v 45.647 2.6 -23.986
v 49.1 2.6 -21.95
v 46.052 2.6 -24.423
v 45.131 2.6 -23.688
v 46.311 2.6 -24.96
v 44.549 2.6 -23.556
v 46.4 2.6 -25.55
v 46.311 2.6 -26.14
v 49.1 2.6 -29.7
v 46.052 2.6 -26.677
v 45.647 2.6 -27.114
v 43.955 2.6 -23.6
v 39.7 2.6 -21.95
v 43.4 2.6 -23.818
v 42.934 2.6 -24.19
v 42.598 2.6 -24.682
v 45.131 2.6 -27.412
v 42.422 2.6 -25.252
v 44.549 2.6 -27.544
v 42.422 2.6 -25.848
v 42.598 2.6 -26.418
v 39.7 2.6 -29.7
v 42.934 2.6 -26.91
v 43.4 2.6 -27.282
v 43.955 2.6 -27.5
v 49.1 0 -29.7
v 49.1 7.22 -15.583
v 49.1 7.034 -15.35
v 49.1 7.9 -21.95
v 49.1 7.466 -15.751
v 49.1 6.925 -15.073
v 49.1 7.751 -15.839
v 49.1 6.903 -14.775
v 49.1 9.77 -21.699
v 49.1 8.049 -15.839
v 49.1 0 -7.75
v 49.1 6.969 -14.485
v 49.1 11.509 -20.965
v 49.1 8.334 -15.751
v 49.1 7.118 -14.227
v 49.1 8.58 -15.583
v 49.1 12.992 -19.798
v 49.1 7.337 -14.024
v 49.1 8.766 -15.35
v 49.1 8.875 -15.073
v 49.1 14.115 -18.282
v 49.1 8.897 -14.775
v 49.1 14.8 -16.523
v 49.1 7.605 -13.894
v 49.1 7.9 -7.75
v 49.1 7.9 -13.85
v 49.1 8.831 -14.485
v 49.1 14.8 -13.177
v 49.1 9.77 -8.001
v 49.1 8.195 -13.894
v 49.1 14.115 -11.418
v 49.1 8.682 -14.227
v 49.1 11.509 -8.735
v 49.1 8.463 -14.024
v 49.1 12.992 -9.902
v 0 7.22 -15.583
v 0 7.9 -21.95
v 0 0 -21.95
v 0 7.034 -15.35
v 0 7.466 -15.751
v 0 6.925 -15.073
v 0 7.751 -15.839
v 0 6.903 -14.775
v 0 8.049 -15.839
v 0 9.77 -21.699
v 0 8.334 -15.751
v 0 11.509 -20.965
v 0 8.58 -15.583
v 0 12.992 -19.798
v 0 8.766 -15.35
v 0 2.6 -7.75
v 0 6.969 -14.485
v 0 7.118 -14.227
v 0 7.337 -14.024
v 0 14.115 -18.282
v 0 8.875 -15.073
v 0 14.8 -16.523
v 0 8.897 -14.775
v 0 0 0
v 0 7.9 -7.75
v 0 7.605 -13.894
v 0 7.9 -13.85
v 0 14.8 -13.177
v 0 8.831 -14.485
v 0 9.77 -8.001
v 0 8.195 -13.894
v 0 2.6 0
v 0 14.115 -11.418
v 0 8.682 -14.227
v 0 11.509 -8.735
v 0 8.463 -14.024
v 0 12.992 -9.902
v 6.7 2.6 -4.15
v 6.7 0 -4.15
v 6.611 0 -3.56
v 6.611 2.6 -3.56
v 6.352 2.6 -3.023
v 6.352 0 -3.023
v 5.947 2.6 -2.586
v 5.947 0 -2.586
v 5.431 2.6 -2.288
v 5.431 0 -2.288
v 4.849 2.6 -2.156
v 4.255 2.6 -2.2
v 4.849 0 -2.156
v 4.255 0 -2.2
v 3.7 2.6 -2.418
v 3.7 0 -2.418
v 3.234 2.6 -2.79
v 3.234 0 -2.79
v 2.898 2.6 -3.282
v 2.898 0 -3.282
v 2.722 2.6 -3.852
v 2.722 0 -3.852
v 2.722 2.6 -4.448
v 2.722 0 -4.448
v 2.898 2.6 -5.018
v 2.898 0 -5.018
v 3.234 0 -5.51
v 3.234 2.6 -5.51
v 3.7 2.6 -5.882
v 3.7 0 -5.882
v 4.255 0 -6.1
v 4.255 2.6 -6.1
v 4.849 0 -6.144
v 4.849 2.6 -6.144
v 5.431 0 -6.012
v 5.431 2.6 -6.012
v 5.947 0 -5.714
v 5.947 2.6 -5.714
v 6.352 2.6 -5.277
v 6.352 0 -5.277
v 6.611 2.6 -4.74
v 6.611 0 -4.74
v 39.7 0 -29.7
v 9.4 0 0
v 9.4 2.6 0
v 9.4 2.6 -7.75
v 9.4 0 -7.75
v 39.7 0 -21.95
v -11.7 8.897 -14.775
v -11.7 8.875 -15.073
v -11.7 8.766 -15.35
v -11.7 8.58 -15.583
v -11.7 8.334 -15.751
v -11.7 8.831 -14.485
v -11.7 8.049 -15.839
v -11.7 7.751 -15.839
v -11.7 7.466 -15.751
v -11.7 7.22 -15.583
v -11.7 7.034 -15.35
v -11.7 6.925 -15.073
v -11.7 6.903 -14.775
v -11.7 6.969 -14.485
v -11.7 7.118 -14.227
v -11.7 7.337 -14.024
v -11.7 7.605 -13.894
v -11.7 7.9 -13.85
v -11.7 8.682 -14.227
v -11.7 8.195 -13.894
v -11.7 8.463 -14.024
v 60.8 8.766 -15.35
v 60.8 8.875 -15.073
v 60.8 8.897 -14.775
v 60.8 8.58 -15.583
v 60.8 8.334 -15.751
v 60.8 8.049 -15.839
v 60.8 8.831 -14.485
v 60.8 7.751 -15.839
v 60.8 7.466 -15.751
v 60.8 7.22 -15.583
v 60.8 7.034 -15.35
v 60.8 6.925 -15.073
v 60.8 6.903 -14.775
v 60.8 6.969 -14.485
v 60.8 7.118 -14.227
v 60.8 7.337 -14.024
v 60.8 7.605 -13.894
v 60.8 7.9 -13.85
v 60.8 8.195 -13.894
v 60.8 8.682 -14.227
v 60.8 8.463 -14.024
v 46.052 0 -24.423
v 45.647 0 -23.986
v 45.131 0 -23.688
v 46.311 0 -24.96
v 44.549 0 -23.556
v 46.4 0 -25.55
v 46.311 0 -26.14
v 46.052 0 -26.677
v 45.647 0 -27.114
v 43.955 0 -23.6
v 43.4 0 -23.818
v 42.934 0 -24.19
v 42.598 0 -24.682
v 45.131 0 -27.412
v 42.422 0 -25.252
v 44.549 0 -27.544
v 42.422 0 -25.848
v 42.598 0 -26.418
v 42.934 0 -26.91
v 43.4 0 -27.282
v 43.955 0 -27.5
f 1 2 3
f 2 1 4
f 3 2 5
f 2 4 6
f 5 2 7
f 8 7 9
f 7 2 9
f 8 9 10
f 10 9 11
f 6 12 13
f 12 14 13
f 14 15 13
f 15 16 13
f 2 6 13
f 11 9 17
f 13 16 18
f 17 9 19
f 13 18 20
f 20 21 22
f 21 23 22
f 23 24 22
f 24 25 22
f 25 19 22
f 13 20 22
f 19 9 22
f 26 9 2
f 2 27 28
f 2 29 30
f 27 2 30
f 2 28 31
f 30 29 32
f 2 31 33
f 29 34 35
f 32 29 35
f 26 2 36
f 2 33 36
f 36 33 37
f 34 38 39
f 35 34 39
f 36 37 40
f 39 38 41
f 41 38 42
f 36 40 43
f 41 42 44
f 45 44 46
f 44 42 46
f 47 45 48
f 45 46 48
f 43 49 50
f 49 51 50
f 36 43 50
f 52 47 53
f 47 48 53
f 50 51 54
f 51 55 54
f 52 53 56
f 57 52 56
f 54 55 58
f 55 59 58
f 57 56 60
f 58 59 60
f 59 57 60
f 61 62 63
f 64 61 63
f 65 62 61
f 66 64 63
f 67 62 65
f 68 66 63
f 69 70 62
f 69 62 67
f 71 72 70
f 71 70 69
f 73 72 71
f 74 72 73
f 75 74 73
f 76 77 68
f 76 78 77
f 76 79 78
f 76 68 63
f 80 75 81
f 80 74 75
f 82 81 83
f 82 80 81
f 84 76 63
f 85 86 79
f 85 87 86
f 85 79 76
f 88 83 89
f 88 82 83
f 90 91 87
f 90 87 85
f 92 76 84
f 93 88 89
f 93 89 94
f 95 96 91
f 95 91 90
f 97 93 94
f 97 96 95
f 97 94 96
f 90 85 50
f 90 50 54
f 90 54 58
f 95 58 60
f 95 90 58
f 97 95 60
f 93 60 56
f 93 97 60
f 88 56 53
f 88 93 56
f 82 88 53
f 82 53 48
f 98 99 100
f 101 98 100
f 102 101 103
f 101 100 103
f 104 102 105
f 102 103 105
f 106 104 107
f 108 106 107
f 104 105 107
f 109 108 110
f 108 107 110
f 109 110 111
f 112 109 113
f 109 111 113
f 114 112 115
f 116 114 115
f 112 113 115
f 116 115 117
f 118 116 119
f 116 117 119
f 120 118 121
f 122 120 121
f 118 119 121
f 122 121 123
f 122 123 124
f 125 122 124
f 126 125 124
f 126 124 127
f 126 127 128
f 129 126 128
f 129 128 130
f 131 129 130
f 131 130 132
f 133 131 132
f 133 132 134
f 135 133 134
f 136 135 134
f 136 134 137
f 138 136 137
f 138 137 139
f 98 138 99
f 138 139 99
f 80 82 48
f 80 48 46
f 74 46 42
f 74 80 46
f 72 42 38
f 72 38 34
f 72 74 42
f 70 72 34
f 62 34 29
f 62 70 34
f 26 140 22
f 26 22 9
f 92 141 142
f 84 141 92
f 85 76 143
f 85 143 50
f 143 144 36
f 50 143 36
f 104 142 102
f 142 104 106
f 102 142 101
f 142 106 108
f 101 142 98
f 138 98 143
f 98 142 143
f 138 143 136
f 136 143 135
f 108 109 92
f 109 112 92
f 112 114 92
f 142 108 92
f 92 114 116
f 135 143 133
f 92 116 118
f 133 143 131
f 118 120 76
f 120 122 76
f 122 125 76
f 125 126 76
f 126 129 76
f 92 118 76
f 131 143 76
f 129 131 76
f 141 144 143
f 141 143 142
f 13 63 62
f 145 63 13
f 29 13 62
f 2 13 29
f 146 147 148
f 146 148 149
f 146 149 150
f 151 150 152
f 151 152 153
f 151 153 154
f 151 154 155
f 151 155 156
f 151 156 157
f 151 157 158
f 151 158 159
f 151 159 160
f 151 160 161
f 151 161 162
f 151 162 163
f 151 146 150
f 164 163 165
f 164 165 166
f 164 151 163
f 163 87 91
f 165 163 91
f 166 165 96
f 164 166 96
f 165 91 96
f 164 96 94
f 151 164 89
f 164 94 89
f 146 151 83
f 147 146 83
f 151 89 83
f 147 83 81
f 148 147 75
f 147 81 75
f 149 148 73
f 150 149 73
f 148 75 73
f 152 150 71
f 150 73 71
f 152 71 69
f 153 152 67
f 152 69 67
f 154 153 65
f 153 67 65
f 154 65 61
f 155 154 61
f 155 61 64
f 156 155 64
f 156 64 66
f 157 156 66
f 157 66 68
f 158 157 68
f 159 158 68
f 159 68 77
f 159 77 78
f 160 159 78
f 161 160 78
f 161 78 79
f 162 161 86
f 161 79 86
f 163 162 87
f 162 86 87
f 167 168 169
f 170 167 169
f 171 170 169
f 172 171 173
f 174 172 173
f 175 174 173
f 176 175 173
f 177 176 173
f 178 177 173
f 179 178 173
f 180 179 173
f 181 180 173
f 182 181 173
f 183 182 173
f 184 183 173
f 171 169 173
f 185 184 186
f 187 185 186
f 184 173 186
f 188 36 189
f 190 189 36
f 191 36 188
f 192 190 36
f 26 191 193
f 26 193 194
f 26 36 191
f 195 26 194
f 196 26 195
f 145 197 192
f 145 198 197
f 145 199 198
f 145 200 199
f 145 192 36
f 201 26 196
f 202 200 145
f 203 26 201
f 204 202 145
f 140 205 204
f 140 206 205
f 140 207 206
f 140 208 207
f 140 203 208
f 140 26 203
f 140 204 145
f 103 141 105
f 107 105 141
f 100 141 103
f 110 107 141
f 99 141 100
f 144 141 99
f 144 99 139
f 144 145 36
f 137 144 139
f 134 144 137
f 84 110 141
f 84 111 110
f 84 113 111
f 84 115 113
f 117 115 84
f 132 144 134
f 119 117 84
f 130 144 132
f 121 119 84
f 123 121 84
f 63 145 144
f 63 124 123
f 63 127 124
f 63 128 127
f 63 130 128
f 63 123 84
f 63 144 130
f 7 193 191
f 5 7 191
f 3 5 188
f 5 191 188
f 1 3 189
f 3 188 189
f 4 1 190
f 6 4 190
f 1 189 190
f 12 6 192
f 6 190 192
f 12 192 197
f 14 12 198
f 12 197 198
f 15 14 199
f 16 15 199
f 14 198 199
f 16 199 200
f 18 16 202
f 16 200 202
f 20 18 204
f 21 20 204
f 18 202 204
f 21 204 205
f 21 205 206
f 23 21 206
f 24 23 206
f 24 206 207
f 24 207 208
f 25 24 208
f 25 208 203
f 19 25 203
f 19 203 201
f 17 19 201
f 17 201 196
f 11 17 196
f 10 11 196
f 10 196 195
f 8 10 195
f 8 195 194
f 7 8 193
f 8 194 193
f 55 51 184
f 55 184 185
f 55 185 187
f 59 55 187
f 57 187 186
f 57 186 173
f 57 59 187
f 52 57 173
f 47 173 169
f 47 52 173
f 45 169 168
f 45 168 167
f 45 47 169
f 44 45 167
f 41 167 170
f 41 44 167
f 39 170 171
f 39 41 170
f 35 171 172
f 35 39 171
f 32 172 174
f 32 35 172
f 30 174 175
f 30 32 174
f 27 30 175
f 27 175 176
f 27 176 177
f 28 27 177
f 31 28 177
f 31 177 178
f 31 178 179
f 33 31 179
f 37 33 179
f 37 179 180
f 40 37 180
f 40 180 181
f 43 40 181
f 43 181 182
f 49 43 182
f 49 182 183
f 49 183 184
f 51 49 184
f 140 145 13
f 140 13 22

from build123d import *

# Parameters (mm, degrees)
DODANIE_WYCI_GNI_CIE1_DEPTH      = 2.6
SZKIC4_R                         = 2
WYTNIJ_WYCI_GNI_CIE1_DEPTH       = 2.6
SZKIC5_W                         = 49.1
SZKIC5_H                         = 14.2
DODANIE_WYCI_GNI_CIE3_DEPTH      = 5.3
DODANIE_WYCI_GNI_CIE4_DEPTH      = 49.1
SZKIC10_R                        = 1
DODANIE_WYCI_GNI_CIE5_DEPTH      = 11.7
DODANIE_WYCI_GNI_CIE5_DEPTH_BACK = 60.8


with BuildPart() as part:
    # Szkic1 → Dodanie-wyciągnięcie1 (new body)
    with BuildSketch(Plane(origin=(0, 0, 0), x_dir=(1, 0, 0), z_dir=(0, 1, 0))):
        Polygon((0, 0), (0, 21.95), (39.7, 21.95), (39.7, 29.7), (49.1, 29.7), (49.1, 7.75), (9.4, 7.75), (9.4, 0), align=None)
    extrude(amount=DODANIE_WYCI_GNI_CIE1_DEPTH)

    # Szkic4 → Wytnij-wyciągnięcie1 (cut)
    with BuildSketch(Plane.XZ):
        with Locations((4.7, -4.15)):
            Circle(SZKIC4_R)
        with Locations((44.4, -25.55)):
            Circle(SZKIC4_R)
    extrude(amount=-WYTNIJ_WYCI_GNI_CIE1_DEPTH, mode=Mode.SUBTRACT)

    # Szkic5 → Dodanie-wyciągnięcie3 (add)
    with BuildSketch(Plane(origin=(0, 2.6, 0), x_dir=(1, 0, 0), z_dir=(0, 1, 0))):
        with Locations((24.55, 14.85)):
            Rectangle(SZKIC5_W, SZKIC5_H)
    extrude(amount=DODANIE_WYCI_GNI_CIE3_DEPTH)

    # Szkic7 → Dodanie-wyciągnięcie4 (add)
    with BuildSketch(Plane(origin=(0, 0, 0), x_dir=(0, 0, -1), z_dir=(1, 0, 0))):
        with BuildLine():
            Line((13.176679947, 14.8), (16.523320053, 14.8))
            ThreePointArc((16.523320053, 14.8), (14.85, 0.8), (13.176679947, 14.8))
        make_face()
    extrude(amount=DODANIE_WYCI_GNI_CIE4_DEPTH)

    # Szkic10 → Dodanie-wyciągnięcie5 (add, two sides)
    with BuildSketch(Plane.ZY) as dodanie_wyci_gni_cie5_sk:
        with Locations((-14.85, 7.9)):
            Circle(SZKIC10_R)
    extrude(amount=DODANIE_WYCI_GNI_CIE5_DEPTH)
    extrude(dodanie_wyci_gni_cie5_sk.sketch, amount=-DODANIE_WYCI_GNI_CIE5_DEPTH_BACK)


solid = part.part
